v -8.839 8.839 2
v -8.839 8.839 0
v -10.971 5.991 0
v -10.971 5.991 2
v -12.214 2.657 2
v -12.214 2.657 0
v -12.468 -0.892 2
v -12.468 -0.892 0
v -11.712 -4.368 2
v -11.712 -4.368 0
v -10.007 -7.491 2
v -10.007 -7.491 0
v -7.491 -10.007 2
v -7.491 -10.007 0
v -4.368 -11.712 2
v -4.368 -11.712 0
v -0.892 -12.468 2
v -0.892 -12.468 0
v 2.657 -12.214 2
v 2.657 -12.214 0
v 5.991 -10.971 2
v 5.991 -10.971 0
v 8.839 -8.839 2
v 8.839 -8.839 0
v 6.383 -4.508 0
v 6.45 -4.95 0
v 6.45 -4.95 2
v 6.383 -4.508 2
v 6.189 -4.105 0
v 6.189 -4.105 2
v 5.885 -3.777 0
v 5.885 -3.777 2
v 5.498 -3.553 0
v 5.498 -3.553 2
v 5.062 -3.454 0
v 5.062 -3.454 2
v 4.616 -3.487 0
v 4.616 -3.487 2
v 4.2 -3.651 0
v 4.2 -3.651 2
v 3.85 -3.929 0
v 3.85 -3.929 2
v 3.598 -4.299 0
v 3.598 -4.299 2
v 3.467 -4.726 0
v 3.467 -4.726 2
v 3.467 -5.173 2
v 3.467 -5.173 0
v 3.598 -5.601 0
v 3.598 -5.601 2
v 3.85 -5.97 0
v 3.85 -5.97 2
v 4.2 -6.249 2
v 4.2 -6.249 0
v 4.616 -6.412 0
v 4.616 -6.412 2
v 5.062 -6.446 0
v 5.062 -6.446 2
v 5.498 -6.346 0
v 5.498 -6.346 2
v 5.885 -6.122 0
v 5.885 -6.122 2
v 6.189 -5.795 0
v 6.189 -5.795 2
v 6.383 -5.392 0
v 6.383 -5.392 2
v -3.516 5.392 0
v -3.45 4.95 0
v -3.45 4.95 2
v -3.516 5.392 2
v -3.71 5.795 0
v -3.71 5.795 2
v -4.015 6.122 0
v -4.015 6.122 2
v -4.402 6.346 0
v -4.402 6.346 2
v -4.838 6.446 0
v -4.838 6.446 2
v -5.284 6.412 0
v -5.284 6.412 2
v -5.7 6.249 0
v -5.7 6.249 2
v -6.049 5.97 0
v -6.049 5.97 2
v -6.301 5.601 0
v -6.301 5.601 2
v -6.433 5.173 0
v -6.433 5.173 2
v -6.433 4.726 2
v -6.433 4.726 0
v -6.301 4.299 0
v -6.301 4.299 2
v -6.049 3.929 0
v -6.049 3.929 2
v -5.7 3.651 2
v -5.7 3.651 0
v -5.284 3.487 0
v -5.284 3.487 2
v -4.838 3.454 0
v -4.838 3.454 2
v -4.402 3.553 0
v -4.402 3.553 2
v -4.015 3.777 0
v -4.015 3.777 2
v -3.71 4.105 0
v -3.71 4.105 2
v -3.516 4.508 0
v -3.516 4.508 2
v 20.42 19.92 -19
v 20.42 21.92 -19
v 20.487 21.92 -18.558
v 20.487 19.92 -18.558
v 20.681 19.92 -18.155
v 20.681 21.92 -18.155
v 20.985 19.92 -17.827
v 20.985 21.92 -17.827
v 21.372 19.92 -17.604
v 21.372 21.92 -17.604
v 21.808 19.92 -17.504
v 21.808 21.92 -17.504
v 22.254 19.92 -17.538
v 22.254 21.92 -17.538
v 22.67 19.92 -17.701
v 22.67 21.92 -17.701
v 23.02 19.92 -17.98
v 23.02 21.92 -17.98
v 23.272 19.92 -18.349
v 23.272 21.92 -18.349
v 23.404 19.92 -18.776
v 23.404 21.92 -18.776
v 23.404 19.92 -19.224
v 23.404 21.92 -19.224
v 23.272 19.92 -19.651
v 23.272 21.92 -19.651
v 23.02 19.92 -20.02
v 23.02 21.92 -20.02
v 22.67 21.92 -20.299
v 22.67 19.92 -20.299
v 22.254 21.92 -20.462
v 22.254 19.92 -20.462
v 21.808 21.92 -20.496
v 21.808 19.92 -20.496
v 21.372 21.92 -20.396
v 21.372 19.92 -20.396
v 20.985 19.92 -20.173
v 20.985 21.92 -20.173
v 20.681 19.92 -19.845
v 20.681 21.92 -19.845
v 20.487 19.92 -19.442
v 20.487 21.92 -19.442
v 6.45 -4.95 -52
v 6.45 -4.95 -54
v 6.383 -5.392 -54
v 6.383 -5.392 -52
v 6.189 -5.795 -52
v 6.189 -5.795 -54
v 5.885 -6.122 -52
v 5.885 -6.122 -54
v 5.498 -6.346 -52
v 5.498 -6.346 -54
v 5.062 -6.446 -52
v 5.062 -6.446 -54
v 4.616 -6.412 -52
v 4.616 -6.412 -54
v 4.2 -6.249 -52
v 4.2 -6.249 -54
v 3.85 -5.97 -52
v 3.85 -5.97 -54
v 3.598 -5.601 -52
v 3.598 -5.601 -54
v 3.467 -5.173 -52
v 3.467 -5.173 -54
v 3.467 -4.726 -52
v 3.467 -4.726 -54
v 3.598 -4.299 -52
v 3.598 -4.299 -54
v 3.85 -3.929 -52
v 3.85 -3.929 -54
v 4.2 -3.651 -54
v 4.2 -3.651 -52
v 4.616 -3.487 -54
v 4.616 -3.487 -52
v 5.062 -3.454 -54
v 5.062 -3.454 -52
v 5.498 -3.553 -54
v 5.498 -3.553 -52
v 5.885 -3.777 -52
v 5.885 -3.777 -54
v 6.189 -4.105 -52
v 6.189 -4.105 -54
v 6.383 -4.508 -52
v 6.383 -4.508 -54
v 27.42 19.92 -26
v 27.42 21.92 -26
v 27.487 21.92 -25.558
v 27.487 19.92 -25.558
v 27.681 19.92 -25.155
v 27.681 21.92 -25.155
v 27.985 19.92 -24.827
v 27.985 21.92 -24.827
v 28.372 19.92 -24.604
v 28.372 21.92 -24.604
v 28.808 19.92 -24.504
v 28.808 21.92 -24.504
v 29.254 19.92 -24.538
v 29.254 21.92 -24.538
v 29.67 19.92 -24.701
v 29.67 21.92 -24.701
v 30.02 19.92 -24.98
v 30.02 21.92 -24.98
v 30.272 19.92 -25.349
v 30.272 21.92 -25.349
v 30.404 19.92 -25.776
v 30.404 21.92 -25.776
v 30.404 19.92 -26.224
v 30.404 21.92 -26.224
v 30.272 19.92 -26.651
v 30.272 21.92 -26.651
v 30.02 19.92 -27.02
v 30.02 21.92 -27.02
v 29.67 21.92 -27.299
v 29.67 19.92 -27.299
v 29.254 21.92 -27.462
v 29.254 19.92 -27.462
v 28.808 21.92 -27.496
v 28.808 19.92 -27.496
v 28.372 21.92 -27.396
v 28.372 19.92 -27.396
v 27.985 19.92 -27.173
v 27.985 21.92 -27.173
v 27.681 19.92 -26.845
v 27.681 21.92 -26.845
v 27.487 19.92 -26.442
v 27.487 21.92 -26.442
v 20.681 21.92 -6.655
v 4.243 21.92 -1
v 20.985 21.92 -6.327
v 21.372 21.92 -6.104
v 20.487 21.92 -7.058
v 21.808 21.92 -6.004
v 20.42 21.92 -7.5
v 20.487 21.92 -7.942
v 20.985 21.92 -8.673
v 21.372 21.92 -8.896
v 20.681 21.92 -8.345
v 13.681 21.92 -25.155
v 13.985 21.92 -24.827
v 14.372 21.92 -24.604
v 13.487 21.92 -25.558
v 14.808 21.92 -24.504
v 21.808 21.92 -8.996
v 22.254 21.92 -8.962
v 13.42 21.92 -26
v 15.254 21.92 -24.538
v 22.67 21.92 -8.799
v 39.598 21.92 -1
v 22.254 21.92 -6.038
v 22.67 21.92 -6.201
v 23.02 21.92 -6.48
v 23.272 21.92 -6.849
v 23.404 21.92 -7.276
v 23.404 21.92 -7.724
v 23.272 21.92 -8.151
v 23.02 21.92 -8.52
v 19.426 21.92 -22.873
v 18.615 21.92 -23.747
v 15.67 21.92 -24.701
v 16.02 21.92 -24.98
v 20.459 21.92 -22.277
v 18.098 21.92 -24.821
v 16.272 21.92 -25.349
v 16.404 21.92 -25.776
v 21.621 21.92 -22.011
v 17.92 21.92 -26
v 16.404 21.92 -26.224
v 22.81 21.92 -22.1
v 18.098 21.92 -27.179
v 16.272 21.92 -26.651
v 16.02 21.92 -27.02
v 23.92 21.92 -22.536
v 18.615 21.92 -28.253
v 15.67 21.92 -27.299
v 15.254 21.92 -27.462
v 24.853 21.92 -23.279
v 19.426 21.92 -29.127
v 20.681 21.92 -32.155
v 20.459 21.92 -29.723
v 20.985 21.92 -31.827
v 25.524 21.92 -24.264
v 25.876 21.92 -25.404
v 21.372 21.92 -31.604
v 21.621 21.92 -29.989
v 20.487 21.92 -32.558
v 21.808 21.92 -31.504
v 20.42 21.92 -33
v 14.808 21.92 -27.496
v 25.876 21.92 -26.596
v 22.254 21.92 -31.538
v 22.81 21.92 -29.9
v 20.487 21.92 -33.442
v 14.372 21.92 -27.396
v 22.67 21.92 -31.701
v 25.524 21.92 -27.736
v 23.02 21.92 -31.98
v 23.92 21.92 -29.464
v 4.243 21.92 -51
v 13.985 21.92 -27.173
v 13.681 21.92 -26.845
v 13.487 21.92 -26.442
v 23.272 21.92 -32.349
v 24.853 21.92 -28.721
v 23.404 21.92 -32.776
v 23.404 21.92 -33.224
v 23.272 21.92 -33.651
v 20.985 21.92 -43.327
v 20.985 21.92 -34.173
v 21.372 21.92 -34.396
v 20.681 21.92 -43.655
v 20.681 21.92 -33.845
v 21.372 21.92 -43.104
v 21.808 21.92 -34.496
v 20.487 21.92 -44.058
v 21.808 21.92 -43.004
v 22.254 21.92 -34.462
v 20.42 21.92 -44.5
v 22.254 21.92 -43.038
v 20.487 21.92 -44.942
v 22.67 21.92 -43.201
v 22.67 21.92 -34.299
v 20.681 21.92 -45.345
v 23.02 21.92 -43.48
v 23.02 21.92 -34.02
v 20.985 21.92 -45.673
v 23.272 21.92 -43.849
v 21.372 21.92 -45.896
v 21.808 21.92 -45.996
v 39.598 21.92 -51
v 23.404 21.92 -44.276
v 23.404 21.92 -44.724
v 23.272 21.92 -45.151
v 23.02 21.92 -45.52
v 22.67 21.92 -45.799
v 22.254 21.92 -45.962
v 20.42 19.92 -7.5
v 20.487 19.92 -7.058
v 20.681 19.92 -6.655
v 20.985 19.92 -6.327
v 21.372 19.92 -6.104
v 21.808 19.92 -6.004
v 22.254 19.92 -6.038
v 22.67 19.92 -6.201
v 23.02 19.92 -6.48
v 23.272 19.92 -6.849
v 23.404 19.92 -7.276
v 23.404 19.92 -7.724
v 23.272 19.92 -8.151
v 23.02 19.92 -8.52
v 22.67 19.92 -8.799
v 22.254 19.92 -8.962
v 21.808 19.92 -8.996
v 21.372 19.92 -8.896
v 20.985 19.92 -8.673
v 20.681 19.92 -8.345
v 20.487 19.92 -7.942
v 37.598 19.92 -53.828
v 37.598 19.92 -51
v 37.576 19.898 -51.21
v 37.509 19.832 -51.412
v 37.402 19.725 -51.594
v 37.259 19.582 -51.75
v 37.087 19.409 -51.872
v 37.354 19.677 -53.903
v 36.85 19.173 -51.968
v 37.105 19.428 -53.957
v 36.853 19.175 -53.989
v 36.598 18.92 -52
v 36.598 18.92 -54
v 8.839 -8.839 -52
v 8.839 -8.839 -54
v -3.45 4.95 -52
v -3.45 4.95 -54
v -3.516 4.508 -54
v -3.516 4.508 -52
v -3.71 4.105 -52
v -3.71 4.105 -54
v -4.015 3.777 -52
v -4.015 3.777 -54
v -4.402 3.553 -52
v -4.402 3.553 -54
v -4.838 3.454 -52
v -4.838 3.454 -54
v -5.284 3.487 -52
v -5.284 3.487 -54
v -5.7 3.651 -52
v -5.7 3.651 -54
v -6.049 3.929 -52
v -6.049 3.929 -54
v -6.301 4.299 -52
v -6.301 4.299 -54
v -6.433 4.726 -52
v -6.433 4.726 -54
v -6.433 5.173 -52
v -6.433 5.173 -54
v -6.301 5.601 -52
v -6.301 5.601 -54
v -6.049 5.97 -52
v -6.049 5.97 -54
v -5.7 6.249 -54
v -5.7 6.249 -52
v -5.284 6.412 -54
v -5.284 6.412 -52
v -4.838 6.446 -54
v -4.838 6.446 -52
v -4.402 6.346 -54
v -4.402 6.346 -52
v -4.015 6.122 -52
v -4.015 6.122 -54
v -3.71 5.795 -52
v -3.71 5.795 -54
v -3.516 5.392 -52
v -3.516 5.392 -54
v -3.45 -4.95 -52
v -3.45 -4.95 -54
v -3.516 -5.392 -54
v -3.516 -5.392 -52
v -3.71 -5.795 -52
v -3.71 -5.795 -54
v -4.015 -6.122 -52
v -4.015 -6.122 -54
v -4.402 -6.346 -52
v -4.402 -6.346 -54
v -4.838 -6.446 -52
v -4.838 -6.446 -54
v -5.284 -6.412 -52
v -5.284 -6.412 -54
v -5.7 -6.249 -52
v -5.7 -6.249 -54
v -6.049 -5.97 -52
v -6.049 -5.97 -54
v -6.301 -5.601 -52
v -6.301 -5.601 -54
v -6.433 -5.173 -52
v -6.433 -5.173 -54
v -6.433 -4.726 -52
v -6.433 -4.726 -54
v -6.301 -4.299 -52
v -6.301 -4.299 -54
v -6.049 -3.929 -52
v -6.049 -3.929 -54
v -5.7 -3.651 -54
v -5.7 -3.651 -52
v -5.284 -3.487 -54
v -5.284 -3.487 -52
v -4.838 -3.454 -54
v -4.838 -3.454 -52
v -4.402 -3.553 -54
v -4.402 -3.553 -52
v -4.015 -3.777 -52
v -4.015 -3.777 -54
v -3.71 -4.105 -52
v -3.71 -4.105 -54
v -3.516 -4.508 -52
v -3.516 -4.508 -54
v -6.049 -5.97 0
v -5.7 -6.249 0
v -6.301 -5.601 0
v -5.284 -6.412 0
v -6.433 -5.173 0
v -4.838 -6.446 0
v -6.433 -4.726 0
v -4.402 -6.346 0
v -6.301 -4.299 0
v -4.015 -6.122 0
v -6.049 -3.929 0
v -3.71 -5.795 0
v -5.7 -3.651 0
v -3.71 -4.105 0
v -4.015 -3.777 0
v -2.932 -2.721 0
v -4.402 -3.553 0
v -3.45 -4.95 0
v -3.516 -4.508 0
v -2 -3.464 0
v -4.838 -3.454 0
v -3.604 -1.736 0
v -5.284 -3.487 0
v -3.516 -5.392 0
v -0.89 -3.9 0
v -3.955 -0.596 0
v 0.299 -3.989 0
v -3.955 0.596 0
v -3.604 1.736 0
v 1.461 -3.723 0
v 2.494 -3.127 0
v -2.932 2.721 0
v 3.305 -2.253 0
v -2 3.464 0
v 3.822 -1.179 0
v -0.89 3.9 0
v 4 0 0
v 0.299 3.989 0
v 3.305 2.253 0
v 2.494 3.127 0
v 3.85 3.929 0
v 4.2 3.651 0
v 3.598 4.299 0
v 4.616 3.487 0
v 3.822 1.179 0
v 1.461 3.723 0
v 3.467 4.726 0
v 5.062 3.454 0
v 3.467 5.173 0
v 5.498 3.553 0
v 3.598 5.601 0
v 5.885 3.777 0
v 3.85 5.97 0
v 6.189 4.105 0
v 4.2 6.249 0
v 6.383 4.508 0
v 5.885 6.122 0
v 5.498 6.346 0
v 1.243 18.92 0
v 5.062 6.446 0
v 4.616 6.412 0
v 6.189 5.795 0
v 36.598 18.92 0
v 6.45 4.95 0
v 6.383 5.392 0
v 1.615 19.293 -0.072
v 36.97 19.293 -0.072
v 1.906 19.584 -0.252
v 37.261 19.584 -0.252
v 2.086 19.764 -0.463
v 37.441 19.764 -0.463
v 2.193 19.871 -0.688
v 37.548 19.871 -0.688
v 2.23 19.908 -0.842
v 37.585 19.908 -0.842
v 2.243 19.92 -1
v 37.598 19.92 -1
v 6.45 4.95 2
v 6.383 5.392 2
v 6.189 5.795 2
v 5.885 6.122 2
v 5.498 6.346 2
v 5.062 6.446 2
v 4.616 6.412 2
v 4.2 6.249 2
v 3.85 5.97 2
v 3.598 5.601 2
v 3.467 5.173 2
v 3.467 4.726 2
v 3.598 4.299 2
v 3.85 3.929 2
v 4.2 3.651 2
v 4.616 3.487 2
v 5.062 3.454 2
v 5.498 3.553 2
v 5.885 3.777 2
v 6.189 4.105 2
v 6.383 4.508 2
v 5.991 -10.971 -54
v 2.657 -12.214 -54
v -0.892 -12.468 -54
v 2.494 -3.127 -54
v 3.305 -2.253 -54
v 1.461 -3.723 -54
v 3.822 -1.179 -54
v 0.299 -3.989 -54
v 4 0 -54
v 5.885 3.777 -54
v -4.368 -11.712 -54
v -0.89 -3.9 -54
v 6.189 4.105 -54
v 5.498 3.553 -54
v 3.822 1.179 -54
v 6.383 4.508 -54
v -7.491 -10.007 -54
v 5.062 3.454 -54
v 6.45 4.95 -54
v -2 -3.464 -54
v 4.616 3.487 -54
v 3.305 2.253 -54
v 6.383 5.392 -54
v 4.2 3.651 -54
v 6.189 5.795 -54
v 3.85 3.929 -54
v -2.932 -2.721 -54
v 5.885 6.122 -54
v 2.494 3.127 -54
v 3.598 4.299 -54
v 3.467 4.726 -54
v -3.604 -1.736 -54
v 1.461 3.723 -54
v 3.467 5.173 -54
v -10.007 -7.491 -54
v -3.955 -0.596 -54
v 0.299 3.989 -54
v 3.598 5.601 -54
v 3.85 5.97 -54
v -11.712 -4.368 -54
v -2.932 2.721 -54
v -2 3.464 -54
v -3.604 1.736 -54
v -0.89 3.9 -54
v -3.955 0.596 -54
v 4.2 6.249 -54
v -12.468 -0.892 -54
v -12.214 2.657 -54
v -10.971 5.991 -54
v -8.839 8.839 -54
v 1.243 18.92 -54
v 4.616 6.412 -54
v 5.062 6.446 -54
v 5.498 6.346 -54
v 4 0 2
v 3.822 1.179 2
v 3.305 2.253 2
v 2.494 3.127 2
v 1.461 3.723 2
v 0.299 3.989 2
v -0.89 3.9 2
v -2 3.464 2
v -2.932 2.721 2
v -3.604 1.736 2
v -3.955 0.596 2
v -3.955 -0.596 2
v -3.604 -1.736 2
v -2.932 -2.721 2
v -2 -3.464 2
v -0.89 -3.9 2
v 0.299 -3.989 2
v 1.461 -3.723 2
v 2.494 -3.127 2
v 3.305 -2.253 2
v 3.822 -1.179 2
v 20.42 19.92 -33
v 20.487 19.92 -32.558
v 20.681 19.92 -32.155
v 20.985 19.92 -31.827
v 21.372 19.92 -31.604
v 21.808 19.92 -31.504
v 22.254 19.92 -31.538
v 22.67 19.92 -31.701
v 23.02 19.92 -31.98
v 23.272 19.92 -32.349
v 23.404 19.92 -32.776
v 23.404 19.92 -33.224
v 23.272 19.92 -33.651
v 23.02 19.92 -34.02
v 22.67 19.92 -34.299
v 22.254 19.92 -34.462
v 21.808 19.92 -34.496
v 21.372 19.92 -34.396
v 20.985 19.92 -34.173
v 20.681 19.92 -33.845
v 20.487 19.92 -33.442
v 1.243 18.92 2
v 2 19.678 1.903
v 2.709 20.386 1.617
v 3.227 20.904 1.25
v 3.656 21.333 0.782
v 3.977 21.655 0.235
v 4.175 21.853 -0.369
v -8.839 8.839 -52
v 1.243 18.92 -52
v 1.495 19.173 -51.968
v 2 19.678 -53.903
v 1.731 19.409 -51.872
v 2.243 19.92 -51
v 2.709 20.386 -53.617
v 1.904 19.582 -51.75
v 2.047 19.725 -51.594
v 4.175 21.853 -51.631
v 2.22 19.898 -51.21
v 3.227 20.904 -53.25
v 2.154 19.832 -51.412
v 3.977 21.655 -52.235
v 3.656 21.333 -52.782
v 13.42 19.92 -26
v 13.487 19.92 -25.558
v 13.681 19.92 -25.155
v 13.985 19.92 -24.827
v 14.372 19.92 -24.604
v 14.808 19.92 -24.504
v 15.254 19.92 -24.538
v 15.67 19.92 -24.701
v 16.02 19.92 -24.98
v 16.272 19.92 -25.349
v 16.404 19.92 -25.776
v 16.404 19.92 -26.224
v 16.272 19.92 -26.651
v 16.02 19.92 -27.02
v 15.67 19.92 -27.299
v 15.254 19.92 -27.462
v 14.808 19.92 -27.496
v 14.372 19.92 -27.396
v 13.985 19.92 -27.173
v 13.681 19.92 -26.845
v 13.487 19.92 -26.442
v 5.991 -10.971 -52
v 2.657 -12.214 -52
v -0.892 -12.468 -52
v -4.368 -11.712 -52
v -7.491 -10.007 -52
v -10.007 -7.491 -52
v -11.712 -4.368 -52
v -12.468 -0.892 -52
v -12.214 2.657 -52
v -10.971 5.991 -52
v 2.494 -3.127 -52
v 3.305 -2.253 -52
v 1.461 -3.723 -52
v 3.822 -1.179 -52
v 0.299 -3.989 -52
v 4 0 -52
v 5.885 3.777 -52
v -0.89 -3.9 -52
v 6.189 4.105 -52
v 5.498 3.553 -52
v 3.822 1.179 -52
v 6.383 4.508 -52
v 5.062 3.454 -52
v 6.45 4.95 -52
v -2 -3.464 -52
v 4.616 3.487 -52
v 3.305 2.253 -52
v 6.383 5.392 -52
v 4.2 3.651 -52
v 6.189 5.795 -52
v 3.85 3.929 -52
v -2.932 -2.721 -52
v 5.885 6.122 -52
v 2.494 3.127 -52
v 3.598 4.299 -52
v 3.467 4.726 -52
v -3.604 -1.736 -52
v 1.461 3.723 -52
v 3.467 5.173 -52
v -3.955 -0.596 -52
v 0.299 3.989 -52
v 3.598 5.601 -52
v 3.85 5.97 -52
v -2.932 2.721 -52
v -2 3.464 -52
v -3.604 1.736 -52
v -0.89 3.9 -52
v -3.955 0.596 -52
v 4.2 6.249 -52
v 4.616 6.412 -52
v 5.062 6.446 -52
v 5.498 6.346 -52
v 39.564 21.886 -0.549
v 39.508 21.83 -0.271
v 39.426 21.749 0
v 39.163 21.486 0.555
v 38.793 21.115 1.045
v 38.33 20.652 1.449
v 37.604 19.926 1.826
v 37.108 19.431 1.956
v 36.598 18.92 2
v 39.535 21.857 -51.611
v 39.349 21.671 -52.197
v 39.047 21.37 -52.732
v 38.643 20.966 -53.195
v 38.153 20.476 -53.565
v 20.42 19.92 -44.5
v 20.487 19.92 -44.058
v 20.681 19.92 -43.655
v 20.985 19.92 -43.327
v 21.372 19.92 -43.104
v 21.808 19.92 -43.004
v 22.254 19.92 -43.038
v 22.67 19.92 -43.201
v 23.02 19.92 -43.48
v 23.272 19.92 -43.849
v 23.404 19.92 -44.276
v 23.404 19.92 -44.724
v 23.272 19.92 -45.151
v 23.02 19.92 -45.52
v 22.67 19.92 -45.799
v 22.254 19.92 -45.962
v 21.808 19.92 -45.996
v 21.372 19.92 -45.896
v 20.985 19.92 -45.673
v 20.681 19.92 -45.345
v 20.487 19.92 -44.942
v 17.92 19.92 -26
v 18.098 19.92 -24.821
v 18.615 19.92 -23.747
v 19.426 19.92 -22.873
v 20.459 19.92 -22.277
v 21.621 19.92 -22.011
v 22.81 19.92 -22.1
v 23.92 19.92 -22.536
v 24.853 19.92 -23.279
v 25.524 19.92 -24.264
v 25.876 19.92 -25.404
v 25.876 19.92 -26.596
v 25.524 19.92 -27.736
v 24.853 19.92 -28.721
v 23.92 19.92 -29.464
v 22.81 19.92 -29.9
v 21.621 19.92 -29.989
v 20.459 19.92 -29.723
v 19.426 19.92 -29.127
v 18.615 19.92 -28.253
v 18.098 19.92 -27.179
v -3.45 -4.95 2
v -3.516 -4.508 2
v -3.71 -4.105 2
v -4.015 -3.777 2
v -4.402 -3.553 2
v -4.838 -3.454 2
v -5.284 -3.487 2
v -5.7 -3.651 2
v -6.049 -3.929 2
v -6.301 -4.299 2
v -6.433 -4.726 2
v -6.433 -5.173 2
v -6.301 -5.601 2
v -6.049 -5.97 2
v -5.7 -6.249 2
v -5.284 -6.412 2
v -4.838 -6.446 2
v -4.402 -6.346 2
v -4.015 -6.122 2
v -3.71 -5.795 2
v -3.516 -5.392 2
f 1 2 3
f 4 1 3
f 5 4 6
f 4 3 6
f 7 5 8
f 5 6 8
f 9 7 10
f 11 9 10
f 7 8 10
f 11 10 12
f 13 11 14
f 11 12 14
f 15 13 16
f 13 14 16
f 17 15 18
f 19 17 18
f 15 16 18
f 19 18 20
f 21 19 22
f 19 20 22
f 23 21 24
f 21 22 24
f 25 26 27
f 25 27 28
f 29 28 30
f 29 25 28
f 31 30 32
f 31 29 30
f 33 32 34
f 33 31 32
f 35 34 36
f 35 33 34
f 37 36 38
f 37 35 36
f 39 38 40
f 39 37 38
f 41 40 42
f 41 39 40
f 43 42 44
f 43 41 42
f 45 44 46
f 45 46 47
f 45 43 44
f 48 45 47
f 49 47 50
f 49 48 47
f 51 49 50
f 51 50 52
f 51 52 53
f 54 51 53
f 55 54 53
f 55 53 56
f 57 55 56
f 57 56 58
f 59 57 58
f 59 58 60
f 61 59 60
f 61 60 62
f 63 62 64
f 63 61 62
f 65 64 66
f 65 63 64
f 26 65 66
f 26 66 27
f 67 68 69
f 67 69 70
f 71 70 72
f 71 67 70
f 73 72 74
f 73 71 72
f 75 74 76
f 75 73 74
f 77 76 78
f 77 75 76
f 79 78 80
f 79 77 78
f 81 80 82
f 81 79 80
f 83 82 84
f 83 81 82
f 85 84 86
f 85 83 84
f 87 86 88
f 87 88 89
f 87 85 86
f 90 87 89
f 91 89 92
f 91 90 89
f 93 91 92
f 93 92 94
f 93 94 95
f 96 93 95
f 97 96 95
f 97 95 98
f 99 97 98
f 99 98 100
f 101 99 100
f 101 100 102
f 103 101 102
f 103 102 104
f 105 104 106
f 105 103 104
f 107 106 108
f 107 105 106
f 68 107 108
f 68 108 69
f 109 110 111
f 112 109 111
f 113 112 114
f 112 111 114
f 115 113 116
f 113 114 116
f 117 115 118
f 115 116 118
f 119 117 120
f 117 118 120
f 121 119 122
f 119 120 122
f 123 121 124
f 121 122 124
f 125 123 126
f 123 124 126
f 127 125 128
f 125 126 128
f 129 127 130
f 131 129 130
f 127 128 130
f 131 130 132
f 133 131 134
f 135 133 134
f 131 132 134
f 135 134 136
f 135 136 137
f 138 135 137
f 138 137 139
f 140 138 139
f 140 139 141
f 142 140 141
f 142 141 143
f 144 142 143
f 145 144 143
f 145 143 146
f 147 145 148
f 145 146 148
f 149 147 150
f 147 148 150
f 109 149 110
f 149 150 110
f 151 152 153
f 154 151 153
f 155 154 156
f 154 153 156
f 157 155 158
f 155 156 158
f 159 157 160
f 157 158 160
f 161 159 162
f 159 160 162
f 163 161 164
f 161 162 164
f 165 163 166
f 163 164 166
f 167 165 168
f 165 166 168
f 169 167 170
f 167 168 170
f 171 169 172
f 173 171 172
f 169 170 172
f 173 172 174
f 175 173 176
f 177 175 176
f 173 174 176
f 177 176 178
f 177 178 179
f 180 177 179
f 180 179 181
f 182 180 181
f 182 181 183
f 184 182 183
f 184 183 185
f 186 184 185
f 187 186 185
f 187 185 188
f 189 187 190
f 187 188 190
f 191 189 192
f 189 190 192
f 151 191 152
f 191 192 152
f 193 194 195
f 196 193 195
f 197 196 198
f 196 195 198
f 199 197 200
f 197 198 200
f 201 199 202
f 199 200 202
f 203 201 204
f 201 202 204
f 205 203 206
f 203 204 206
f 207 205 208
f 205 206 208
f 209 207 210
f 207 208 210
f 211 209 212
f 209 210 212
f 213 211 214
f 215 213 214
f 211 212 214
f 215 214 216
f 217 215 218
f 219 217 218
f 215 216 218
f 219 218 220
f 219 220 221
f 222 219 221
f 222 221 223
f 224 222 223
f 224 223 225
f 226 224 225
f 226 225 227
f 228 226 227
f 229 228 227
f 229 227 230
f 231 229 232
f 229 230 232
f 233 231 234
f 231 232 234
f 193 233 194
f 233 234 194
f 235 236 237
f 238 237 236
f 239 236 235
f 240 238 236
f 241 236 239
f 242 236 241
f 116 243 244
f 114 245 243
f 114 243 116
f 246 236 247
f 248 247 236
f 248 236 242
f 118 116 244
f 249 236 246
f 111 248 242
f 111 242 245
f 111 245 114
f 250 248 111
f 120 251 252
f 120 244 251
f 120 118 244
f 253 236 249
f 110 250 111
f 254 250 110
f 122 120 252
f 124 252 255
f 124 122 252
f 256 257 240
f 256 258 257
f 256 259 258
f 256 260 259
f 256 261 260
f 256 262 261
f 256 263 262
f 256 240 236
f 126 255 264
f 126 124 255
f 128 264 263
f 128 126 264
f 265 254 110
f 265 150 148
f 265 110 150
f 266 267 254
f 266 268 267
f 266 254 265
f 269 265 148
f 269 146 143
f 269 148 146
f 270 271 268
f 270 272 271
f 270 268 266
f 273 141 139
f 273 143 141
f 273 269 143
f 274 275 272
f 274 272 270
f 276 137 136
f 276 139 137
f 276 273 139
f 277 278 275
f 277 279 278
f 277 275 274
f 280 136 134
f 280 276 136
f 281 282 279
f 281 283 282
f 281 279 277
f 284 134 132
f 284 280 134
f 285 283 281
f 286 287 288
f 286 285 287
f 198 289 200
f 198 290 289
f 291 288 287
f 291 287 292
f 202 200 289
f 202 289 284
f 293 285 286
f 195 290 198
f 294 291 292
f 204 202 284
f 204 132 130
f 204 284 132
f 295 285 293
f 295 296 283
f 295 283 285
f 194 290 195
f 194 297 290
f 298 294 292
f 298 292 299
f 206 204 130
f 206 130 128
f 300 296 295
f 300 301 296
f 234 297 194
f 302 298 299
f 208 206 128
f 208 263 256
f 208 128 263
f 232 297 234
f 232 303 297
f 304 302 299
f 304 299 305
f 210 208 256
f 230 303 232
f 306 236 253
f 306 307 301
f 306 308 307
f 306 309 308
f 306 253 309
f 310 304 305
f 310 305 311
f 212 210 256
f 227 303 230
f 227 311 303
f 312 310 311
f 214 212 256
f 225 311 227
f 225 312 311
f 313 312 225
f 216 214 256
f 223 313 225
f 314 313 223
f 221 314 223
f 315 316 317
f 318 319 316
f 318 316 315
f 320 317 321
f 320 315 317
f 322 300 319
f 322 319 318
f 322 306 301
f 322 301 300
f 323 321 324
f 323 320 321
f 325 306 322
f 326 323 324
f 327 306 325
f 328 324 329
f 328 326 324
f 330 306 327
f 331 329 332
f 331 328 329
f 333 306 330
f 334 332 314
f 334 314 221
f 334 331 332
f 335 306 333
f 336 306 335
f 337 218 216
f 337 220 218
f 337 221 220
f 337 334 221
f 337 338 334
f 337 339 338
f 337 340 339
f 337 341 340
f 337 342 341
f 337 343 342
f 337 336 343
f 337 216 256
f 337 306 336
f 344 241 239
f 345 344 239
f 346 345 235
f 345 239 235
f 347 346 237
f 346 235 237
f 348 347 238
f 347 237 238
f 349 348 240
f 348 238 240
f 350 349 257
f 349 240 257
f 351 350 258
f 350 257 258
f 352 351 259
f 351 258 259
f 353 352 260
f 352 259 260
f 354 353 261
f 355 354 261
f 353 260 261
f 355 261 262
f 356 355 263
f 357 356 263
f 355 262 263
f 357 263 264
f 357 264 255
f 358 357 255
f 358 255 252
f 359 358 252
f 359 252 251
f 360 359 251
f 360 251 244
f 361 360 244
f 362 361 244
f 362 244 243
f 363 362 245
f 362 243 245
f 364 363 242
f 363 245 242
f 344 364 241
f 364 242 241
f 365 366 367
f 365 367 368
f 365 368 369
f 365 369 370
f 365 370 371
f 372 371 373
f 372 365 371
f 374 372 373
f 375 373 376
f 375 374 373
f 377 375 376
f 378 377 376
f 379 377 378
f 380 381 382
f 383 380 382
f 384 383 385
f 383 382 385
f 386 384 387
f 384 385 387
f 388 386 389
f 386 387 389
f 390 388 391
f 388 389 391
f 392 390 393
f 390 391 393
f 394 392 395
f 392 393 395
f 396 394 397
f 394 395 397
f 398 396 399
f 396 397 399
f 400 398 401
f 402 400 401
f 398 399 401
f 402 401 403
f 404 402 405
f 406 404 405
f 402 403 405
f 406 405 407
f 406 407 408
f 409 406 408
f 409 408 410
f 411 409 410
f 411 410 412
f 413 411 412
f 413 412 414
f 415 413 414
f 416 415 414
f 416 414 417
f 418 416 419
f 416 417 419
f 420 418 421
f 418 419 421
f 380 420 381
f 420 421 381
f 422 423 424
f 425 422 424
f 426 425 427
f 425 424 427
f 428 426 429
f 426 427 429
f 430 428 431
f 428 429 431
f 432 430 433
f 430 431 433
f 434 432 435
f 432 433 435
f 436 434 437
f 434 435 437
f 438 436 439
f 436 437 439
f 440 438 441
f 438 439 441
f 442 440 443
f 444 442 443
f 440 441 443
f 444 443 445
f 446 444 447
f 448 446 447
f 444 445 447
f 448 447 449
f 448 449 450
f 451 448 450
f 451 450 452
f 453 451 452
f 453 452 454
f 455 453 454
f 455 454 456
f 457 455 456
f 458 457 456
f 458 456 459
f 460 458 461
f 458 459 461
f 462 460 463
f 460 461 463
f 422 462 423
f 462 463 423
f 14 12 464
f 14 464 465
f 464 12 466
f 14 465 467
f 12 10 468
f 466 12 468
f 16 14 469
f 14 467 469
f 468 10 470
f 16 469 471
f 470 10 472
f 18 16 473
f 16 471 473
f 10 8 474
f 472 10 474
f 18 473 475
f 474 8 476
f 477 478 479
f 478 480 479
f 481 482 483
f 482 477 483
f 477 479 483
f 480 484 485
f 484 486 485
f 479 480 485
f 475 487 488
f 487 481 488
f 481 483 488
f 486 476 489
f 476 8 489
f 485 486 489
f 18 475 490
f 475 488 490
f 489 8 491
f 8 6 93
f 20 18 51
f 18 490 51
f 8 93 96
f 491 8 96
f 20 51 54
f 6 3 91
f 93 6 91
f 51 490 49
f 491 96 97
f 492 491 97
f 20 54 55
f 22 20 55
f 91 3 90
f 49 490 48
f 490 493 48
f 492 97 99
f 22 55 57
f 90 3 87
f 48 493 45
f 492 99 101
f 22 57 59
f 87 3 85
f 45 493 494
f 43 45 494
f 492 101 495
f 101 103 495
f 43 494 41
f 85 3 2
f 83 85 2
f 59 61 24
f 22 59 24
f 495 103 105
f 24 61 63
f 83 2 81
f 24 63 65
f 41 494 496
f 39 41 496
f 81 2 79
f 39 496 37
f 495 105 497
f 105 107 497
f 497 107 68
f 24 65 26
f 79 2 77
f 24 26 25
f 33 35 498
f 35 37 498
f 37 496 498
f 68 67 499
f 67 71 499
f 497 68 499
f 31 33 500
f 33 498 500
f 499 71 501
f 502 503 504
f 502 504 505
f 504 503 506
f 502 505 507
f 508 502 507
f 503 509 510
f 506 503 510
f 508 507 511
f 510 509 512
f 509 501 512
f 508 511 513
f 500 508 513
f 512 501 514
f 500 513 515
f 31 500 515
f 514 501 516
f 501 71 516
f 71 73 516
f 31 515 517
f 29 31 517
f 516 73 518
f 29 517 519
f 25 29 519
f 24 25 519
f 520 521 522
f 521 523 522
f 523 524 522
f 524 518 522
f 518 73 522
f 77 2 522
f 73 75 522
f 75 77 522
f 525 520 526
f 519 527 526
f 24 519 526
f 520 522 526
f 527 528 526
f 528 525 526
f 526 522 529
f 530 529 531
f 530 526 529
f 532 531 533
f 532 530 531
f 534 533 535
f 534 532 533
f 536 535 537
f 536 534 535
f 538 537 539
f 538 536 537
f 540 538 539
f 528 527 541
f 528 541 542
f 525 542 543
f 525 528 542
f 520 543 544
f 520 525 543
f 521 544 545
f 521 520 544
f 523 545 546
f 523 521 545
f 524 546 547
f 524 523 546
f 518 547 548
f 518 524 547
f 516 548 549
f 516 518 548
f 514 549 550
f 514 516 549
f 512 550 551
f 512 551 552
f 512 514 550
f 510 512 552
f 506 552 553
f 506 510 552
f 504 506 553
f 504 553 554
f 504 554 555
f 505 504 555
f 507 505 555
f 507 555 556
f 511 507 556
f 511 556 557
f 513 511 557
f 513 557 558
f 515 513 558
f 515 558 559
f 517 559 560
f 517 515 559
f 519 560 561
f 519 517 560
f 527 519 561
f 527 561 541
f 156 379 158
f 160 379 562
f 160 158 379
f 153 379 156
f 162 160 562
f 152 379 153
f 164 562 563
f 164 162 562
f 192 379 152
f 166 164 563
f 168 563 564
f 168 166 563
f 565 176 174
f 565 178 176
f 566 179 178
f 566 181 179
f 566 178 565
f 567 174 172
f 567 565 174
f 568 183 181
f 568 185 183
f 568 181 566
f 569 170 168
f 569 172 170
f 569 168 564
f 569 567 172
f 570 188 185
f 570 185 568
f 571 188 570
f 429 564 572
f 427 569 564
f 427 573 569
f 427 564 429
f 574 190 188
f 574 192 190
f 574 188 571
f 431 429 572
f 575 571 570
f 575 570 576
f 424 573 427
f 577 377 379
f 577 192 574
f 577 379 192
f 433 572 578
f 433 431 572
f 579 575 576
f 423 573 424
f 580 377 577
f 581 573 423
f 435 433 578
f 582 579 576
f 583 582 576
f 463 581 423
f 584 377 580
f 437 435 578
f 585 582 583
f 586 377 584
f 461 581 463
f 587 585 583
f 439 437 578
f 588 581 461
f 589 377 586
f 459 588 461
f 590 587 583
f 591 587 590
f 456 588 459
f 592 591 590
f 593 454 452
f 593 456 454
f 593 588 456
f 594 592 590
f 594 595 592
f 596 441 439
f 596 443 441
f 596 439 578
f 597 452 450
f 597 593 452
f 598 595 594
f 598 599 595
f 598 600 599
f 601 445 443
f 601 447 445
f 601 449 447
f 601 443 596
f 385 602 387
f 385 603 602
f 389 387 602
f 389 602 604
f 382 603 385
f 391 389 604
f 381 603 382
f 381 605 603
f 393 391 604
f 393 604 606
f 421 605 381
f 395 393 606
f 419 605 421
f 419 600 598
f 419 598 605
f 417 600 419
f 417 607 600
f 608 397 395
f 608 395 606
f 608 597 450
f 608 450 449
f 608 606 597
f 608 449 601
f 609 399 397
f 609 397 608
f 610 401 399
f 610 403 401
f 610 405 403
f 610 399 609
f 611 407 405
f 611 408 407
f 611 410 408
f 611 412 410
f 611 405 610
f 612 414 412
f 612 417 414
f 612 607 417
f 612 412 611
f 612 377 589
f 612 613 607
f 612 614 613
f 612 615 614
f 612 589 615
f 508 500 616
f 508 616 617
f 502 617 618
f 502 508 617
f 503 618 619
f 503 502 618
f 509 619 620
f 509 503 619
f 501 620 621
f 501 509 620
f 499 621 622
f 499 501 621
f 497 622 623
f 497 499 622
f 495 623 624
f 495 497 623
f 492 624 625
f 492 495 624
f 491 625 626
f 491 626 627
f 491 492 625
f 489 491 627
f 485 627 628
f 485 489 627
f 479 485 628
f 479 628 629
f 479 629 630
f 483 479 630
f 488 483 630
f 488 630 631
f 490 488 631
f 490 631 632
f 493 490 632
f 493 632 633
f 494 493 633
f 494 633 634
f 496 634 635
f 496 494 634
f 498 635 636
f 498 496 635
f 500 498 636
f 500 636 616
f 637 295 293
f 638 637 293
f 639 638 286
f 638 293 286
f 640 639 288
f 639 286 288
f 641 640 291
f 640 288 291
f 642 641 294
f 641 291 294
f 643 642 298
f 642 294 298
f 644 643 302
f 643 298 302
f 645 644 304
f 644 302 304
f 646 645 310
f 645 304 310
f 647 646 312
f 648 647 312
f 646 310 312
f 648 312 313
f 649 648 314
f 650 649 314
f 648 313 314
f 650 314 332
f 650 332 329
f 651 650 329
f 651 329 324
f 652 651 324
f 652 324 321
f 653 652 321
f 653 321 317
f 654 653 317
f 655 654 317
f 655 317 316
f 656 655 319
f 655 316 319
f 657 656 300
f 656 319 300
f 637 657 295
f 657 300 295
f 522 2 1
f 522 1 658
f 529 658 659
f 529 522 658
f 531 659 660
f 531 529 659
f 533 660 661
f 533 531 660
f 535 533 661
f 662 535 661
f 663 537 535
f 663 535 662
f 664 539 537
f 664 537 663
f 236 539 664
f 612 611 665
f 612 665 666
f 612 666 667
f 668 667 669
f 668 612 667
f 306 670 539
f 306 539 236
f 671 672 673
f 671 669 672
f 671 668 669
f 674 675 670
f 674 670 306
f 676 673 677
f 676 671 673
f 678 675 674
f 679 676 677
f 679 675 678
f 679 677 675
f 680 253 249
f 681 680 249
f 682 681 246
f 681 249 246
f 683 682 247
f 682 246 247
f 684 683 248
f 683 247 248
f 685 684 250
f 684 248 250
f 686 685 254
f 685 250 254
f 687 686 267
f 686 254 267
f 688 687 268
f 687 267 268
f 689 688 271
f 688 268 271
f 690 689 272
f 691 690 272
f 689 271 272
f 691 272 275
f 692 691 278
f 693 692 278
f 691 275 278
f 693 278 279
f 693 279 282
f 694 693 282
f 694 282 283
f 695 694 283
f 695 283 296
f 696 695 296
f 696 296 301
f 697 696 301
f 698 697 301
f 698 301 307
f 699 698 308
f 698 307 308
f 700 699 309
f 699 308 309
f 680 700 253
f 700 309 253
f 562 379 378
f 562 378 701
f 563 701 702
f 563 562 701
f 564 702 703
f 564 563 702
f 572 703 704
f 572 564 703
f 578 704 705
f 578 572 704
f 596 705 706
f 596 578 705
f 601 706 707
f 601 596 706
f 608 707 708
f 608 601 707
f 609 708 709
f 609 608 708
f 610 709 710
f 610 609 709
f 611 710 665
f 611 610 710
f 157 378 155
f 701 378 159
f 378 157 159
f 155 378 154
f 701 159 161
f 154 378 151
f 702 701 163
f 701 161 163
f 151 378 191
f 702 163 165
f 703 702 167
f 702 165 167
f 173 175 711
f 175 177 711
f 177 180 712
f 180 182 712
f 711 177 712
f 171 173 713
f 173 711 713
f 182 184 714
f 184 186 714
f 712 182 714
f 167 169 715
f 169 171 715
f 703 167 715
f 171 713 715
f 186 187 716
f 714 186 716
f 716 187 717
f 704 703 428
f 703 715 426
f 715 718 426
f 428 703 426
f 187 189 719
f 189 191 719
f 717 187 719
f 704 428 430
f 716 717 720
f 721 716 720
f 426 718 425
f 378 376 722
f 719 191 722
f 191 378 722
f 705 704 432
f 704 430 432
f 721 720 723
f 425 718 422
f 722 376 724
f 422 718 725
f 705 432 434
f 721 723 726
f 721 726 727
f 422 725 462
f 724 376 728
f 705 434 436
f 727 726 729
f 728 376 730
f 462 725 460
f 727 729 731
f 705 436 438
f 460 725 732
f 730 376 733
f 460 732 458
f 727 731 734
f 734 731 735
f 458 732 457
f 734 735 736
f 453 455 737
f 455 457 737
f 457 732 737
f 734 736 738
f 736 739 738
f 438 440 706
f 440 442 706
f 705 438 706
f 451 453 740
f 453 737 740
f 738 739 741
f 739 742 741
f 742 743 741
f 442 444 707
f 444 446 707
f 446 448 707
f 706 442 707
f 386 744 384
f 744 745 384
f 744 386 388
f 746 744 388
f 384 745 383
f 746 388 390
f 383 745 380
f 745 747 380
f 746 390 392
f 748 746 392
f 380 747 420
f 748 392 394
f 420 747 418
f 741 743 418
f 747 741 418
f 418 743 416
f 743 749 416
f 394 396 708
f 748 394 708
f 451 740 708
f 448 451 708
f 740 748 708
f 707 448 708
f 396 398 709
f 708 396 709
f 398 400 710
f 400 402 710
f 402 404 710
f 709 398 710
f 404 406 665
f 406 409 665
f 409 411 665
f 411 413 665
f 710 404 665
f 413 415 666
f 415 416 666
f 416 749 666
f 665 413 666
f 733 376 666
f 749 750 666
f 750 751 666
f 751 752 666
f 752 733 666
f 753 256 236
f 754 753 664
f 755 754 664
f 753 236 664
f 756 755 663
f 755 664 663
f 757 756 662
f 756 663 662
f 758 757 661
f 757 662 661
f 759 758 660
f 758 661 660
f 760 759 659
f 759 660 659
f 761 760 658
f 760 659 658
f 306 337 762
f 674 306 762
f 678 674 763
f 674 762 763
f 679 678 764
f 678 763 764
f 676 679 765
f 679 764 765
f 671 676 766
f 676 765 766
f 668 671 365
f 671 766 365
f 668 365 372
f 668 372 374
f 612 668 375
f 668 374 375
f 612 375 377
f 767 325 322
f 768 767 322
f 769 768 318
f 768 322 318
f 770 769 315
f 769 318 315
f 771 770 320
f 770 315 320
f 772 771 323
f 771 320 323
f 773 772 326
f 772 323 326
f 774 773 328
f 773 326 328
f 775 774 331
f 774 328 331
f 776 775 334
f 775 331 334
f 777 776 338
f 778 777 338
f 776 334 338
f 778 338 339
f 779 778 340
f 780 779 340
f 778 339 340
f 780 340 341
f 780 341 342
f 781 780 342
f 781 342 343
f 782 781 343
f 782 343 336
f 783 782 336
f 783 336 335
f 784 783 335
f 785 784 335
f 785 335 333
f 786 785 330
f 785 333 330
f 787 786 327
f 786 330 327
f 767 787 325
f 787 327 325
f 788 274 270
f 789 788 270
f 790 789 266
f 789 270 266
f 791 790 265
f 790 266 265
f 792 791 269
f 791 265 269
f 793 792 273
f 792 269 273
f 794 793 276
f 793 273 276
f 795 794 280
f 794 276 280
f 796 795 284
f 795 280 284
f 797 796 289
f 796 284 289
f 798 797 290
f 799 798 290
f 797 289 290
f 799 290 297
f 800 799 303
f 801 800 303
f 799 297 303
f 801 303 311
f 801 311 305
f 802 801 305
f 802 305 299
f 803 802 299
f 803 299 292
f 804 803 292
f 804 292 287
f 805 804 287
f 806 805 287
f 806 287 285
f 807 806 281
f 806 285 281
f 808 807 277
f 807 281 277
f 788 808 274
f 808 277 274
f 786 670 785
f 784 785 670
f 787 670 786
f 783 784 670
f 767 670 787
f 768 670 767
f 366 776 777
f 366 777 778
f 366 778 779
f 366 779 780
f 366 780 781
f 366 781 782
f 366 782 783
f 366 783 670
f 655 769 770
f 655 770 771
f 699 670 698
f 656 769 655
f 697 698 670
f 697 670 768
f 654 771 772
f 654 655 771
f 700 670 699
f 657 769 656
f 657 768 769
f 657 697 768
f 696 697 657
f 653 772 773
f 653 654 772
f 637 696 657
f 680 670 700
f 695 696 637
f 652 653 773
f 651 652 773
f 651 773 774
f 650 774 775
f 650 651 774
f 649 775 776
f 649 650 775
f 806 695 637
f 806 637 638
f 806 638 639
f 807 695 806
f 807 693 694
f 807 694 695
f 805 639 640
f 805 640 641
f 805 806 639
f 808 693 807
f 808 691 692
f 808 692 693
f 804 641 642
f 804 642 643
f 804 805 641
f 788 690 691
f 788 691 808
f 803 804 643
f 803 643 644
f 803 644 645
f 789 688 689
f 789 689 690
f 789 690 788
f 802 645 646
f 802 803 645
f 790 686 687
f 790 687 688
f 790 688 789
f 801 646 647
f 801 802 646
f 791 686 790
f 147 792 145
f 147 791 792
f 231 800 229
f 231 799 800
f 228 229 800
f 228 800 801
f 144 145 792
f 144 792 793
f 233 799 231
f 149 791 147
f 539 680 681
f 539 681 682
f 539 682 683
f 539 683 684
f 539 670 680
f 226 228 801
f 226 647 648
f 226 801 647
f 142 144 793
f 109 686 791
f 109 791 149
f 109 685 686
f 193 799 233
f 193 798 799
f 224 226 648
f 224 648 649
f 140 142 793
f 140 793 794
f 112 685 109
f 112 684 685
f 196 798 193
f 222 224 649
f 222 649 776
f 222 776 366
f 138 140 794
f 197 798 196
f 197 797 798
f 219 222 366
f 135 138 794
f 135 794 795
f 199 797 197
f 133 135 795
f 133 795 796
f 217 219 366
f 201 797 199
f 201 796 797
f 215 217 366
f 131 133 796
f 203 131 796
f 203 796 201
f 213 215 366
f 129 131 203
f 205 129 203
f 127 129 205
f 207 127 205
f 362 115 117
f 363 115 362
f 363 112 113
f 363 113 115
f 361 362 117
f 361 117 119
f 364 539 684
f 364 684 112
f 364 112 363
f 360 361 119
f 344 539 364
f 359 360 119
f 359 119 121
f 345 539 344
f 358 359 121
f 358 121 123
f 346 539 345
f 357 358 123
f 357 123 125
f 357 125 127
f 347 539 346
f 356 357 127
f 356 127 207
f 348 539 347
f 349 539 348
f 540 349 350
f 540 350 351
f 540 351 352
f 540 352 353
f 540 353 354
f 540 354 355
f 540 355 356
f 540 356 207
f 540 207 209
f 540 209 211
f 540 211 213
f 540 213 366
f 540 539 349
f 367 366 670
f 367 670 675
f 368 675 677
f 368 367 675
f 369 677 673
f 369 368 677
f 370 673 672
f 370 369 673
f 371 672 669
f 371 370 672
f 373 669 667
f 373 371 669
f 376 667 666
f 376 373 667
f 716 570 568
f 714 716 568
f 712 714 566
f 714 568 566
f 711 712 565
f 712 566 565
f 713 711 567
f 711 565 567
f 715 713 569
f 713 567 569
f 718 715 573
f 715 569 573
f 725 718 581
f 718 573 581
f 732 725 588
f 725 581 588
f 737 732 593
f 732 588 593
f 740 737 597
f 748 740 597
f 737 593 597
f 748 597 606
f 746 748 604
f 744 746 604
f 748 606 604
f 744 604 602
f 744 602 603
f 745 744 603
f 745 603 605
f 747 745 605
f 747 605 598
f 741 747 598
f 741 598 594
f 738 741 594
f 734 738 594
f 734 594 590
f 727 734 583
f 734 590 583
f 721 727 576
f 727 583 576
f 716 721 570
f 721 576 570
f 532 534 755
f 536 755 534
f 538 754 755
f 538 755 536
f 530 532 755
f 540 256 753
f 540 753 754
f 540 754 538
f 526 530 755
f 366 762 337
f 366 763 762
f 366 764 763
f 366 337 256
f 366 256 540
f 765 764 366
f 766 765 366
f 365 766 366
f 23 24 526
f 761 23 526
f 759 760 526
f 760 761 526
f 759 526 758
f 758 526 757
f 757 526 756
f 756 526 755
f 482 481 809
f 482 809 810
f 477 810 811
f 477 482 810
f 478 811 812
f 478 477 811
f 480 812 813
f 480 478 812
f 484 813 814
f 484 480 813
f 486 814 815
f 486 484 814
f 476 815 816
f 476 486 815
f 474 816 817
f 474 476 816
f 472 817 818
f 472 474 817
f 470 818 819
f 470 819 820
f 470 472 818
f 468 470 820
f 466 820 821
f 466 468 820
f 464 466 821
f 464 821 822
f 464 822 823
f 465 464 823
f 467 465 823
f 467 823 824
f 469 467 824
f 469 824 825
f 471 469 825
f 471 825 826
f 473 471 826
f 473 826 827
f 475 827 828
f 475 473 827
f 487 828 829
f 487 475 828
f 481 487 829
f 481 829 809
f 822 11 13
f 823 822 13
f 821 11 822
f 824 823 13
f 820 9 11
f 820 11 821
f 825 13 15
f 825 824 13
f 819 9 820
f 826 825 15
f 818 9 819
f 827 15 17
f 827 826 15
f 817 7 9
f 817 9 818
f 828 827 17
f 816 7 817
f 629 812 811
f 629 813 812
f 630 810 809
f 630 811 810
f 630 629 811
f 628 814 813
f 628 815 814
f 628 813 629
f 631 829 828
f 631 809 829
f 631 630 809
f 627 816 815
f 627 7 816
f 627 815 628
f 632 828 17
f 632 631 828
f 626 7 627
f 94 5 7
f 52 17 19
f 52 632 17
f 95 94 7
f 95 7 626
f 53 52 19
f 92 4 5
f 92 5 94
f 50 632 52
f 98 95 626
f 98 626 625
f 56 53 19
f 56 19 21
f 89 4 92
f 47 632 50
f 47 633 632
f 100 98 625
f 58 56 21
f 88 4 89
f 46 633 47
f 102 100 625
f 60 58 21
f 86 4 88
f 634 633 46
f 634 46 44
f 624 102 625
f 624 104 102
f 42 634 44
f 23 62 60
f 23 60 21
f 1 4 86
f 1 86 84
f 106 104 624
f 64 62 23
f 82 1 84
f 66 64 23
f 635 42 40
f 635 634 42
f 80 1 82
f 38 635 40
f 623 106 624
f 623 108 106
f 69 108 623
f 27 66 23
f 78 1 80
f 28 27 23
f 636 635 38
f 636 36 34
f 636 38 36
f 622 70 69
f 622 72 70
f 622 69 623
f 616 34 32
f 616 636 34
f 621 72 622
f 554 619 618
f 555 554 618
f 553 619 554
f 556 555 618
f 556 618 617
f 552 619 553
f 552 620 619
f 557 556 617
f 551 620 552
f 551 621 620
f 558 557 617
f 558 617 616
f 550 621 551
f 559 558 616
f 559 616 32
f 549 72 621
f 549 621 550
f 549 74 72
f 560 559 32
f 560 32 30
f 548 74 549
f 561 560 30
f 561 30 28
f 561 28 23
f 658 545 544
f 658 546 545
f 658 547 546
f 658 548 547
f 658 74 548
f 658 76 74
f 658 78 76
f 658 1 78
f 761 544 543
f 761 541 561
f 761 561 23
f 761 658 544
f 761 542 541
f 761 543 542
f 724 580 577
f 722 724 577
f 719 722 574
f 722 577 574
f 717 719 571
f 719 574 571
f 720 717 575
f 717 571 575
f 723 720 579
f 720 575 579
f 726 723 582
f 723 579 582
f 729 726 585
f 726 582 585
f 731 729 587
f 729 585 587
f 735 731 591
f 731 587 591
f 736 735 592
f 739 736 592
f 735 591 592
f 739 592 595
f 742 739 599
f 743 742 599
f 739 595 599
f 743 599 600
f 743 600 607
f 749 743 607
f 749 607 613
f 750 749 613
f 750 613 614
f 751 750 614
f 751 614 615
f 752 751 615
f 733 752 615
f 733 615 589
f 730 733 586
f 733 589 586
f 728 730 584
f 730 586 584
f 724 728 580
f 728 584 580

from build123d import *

# Parameters (mm, degrees)
SKETCH_1_R          = 4
SKETCH_1_R_2        = 1.5
EXTRUDE_1_DEPTH     = 2
EXTRUDE_2_DEPTH     = 52
EXTRUDE_START       = 2
SKETCH_3_R          = 4
SKETCH_3_R_2        = 1.5
EXTRUDE_3_DEPTH     = 2
FILLET_1_R          = 3
FILLET_2_R          = 1
SKETCH_4_R          = 4
SKETCH_4_R_2        = 1.5
CUT_EXTRUDE_1_DEPTH = 2
SKETCH_5_R          = 1.5
CUT_EXTRUDE_2_DEPTH = 2


with BuildPart() as part:
    # 草图1 → 凸台-拉伸1 (new body)
    with BuildSketch(Plane.XY):
        with BuildLine():
            Line((8.838834765, -8.838834765), (39.597979746, 21.920310217))
            Line((39.597979746, 21.920310217), (4.242640687, 21.920310217))
            Line((4.242640687, 21.920310217), (-8.838834765, 8.838834765))
            ThreePointArc((-8.838834765, 8.838834765), (-8.838834765, -8.838834765), (8.838834765, -8.838834765))
        make_face()
        Circle(SKETCH_1_R, mode=Mode.SUBTRACT)
        with Locations((4.949747468, -4.949747468)):
            Circle(SKETCH_1_R_2, mode=Mode.SUBTRACT)
        with Locations((-4.949747468, -4.949747468)):
            Circle(SKETCH_1_R_2, mode=Mode.SUBTRACT)
        with Locations((-4.949747468, 4.949747468)):
            Circle(SKETCH_1_R_2, mode=Mode.SUBTRACT)
        with Locations((4.949747468, 4.949747468)):
            Circle(SKETCH_1_R_2, mode=Mode.SUBTRACT)
    extrude(amount=EXTRUDE_1_DEPTH)

    # 草图2 → 凸台-拉伸2 (add)
    with BuildSketch(Plane(origin=(0, 0, 0), x_dir=(-1, 0, 0), z_dir=(0, 0, -1))):
        Polygon((-39.597979746, 21.920310217), (-4.242640687, 21.920310217), (-2.242640687, 19.920310217), (-37.597979746, 19.920310217), align=None)
    extrude(amount=EXTRUDE_2_DEPTH)

    # 草图3 → 凸台-拉伸3 (add)
    with BuildSketch(Plane(origin=(0, 0, -52), x_dir=(-1, 0, 0), z_dir=(0, 0, -1)).offset(EXTRUDE_START)):
        with BuildLine():
            Line((-2.242640687, 19.920310217), (-4.242640687, 21.920310217))
            Line((-4.242640687, 21.920310217), (-39.597979746, 21.920310217))
            Line((-39.597979746, 21.920310217), (-37.597979746, 19.920310217))
            Line((-37.597979746, 19.920310217), (-8.838834765, -8.838834765))
            ThreePointArc((-8.838834765, -8.838834765), (8.838834765, -8.838834765), (8.838834765, 8.838834765))
            Line((8.838834765, 8.838834765), (-2.242640687, 19.920310217))
        make_face()
        with Locations(Location((0, 0, 0), (0, 0, 180))):
            Circle(SKETCH_3_R, mode=Mode.SUBTRACT)
        with Locations(Location((-4.949747468, -4.949747468, 0), (0, 0, 180))):
            Circle(SKETCH_3_R_2, mode=Mode.SUBTRACT)
        with Locations(Location((-4.949747468, 4.949747468, 0), (0, 0, 180))):
            Circle(SKETCH_3_R_2, mode=Mode.SUBTRACT)
        with Locations(Location((4.949747468, 4.949747468, 0), (0, 0, 180))):
            Circle(SKETCH_3_R_2, mode=Mode.SUBTRACT)
        with Locations(Location((4.949747468, -4.949747468, 0), (0, 0, 180))):
            Circle(SKETCH_3_R_2, mode=Mode.SUBTRACT)
    extrude(amount=-EXTRUDE_3_DEPTH)

    # 圆角1
    fillet_1_edges = [part.edges().sort_by_distance(p)[0] for p in [
        (21.920310217, 21.920310217, -54),
        (21.920310217, 21.920310217, 2),
    ]]
    fillet(fillet_1_edges, radius=FILLET_1_R)

    # 圆角2
    fillet_2_edges = [part.edges().sort_by_distance(p)[0] for p in [
        (19.920310217, 19.920310217, 0),
        (19.920310217, 19.920310217, -52),
    ]]
    fillet(fillet_2_edges, radius=FILLET_2_R)

    # 草图4 → 切除-拉伸1 (cut)
    with BuildSketch(Plane(origin=(0, 21.920310217, 0), x_dir=(1, 0, 0), z_dir=(0, 1, 0))):
        with Locations(Location((21.920310217, 26, 0), (0, 0, 180))):
            Circle(SKETCH_4_R)
        with Locations(Location((14.920310217, 26, 0), (0, 0, 180))):
            Circle(SKETCH_4_R_2)
        with Locations(Location((21.920310217, 33, 0), (0, 0, 180))):
            Circle(SKETCH_4_R_2)
        with Locations(Location((28.920310217, 26, 0), (0, 0, 180))):
            Circle(SKETCH_4_R_2)
        with Locations(Location((21.920310217, 19, 0), (0, 0, 180))):
            Circle(SKETCH_4_R_2)
    extrude(amount=-CUT_EXTRUDE_1_DEPTH, mode=Mode.SUBTRACT)

    # 草图5 → 切除-拉伸2 (cut)
    with BuildSketch(Plane(origin=(0, 21.920310217, 0), x_dir=(1, 0, 0), z_dir=(0, 1, 0))):
        with Locations(Location((21.920310217, 44.5, 0), (0, 0, 180))):
            Circle(SKETCH_5_R)
        with Locations(Location((21.920310217, 7.5, 0), (0, 0, 180))):
            Circle(SKETCH_5_R)
    extrude(amount=-CUT_EXTRUDE_2_DEPTH, mode=Mode.SUBTRACT)


solid = part.part
